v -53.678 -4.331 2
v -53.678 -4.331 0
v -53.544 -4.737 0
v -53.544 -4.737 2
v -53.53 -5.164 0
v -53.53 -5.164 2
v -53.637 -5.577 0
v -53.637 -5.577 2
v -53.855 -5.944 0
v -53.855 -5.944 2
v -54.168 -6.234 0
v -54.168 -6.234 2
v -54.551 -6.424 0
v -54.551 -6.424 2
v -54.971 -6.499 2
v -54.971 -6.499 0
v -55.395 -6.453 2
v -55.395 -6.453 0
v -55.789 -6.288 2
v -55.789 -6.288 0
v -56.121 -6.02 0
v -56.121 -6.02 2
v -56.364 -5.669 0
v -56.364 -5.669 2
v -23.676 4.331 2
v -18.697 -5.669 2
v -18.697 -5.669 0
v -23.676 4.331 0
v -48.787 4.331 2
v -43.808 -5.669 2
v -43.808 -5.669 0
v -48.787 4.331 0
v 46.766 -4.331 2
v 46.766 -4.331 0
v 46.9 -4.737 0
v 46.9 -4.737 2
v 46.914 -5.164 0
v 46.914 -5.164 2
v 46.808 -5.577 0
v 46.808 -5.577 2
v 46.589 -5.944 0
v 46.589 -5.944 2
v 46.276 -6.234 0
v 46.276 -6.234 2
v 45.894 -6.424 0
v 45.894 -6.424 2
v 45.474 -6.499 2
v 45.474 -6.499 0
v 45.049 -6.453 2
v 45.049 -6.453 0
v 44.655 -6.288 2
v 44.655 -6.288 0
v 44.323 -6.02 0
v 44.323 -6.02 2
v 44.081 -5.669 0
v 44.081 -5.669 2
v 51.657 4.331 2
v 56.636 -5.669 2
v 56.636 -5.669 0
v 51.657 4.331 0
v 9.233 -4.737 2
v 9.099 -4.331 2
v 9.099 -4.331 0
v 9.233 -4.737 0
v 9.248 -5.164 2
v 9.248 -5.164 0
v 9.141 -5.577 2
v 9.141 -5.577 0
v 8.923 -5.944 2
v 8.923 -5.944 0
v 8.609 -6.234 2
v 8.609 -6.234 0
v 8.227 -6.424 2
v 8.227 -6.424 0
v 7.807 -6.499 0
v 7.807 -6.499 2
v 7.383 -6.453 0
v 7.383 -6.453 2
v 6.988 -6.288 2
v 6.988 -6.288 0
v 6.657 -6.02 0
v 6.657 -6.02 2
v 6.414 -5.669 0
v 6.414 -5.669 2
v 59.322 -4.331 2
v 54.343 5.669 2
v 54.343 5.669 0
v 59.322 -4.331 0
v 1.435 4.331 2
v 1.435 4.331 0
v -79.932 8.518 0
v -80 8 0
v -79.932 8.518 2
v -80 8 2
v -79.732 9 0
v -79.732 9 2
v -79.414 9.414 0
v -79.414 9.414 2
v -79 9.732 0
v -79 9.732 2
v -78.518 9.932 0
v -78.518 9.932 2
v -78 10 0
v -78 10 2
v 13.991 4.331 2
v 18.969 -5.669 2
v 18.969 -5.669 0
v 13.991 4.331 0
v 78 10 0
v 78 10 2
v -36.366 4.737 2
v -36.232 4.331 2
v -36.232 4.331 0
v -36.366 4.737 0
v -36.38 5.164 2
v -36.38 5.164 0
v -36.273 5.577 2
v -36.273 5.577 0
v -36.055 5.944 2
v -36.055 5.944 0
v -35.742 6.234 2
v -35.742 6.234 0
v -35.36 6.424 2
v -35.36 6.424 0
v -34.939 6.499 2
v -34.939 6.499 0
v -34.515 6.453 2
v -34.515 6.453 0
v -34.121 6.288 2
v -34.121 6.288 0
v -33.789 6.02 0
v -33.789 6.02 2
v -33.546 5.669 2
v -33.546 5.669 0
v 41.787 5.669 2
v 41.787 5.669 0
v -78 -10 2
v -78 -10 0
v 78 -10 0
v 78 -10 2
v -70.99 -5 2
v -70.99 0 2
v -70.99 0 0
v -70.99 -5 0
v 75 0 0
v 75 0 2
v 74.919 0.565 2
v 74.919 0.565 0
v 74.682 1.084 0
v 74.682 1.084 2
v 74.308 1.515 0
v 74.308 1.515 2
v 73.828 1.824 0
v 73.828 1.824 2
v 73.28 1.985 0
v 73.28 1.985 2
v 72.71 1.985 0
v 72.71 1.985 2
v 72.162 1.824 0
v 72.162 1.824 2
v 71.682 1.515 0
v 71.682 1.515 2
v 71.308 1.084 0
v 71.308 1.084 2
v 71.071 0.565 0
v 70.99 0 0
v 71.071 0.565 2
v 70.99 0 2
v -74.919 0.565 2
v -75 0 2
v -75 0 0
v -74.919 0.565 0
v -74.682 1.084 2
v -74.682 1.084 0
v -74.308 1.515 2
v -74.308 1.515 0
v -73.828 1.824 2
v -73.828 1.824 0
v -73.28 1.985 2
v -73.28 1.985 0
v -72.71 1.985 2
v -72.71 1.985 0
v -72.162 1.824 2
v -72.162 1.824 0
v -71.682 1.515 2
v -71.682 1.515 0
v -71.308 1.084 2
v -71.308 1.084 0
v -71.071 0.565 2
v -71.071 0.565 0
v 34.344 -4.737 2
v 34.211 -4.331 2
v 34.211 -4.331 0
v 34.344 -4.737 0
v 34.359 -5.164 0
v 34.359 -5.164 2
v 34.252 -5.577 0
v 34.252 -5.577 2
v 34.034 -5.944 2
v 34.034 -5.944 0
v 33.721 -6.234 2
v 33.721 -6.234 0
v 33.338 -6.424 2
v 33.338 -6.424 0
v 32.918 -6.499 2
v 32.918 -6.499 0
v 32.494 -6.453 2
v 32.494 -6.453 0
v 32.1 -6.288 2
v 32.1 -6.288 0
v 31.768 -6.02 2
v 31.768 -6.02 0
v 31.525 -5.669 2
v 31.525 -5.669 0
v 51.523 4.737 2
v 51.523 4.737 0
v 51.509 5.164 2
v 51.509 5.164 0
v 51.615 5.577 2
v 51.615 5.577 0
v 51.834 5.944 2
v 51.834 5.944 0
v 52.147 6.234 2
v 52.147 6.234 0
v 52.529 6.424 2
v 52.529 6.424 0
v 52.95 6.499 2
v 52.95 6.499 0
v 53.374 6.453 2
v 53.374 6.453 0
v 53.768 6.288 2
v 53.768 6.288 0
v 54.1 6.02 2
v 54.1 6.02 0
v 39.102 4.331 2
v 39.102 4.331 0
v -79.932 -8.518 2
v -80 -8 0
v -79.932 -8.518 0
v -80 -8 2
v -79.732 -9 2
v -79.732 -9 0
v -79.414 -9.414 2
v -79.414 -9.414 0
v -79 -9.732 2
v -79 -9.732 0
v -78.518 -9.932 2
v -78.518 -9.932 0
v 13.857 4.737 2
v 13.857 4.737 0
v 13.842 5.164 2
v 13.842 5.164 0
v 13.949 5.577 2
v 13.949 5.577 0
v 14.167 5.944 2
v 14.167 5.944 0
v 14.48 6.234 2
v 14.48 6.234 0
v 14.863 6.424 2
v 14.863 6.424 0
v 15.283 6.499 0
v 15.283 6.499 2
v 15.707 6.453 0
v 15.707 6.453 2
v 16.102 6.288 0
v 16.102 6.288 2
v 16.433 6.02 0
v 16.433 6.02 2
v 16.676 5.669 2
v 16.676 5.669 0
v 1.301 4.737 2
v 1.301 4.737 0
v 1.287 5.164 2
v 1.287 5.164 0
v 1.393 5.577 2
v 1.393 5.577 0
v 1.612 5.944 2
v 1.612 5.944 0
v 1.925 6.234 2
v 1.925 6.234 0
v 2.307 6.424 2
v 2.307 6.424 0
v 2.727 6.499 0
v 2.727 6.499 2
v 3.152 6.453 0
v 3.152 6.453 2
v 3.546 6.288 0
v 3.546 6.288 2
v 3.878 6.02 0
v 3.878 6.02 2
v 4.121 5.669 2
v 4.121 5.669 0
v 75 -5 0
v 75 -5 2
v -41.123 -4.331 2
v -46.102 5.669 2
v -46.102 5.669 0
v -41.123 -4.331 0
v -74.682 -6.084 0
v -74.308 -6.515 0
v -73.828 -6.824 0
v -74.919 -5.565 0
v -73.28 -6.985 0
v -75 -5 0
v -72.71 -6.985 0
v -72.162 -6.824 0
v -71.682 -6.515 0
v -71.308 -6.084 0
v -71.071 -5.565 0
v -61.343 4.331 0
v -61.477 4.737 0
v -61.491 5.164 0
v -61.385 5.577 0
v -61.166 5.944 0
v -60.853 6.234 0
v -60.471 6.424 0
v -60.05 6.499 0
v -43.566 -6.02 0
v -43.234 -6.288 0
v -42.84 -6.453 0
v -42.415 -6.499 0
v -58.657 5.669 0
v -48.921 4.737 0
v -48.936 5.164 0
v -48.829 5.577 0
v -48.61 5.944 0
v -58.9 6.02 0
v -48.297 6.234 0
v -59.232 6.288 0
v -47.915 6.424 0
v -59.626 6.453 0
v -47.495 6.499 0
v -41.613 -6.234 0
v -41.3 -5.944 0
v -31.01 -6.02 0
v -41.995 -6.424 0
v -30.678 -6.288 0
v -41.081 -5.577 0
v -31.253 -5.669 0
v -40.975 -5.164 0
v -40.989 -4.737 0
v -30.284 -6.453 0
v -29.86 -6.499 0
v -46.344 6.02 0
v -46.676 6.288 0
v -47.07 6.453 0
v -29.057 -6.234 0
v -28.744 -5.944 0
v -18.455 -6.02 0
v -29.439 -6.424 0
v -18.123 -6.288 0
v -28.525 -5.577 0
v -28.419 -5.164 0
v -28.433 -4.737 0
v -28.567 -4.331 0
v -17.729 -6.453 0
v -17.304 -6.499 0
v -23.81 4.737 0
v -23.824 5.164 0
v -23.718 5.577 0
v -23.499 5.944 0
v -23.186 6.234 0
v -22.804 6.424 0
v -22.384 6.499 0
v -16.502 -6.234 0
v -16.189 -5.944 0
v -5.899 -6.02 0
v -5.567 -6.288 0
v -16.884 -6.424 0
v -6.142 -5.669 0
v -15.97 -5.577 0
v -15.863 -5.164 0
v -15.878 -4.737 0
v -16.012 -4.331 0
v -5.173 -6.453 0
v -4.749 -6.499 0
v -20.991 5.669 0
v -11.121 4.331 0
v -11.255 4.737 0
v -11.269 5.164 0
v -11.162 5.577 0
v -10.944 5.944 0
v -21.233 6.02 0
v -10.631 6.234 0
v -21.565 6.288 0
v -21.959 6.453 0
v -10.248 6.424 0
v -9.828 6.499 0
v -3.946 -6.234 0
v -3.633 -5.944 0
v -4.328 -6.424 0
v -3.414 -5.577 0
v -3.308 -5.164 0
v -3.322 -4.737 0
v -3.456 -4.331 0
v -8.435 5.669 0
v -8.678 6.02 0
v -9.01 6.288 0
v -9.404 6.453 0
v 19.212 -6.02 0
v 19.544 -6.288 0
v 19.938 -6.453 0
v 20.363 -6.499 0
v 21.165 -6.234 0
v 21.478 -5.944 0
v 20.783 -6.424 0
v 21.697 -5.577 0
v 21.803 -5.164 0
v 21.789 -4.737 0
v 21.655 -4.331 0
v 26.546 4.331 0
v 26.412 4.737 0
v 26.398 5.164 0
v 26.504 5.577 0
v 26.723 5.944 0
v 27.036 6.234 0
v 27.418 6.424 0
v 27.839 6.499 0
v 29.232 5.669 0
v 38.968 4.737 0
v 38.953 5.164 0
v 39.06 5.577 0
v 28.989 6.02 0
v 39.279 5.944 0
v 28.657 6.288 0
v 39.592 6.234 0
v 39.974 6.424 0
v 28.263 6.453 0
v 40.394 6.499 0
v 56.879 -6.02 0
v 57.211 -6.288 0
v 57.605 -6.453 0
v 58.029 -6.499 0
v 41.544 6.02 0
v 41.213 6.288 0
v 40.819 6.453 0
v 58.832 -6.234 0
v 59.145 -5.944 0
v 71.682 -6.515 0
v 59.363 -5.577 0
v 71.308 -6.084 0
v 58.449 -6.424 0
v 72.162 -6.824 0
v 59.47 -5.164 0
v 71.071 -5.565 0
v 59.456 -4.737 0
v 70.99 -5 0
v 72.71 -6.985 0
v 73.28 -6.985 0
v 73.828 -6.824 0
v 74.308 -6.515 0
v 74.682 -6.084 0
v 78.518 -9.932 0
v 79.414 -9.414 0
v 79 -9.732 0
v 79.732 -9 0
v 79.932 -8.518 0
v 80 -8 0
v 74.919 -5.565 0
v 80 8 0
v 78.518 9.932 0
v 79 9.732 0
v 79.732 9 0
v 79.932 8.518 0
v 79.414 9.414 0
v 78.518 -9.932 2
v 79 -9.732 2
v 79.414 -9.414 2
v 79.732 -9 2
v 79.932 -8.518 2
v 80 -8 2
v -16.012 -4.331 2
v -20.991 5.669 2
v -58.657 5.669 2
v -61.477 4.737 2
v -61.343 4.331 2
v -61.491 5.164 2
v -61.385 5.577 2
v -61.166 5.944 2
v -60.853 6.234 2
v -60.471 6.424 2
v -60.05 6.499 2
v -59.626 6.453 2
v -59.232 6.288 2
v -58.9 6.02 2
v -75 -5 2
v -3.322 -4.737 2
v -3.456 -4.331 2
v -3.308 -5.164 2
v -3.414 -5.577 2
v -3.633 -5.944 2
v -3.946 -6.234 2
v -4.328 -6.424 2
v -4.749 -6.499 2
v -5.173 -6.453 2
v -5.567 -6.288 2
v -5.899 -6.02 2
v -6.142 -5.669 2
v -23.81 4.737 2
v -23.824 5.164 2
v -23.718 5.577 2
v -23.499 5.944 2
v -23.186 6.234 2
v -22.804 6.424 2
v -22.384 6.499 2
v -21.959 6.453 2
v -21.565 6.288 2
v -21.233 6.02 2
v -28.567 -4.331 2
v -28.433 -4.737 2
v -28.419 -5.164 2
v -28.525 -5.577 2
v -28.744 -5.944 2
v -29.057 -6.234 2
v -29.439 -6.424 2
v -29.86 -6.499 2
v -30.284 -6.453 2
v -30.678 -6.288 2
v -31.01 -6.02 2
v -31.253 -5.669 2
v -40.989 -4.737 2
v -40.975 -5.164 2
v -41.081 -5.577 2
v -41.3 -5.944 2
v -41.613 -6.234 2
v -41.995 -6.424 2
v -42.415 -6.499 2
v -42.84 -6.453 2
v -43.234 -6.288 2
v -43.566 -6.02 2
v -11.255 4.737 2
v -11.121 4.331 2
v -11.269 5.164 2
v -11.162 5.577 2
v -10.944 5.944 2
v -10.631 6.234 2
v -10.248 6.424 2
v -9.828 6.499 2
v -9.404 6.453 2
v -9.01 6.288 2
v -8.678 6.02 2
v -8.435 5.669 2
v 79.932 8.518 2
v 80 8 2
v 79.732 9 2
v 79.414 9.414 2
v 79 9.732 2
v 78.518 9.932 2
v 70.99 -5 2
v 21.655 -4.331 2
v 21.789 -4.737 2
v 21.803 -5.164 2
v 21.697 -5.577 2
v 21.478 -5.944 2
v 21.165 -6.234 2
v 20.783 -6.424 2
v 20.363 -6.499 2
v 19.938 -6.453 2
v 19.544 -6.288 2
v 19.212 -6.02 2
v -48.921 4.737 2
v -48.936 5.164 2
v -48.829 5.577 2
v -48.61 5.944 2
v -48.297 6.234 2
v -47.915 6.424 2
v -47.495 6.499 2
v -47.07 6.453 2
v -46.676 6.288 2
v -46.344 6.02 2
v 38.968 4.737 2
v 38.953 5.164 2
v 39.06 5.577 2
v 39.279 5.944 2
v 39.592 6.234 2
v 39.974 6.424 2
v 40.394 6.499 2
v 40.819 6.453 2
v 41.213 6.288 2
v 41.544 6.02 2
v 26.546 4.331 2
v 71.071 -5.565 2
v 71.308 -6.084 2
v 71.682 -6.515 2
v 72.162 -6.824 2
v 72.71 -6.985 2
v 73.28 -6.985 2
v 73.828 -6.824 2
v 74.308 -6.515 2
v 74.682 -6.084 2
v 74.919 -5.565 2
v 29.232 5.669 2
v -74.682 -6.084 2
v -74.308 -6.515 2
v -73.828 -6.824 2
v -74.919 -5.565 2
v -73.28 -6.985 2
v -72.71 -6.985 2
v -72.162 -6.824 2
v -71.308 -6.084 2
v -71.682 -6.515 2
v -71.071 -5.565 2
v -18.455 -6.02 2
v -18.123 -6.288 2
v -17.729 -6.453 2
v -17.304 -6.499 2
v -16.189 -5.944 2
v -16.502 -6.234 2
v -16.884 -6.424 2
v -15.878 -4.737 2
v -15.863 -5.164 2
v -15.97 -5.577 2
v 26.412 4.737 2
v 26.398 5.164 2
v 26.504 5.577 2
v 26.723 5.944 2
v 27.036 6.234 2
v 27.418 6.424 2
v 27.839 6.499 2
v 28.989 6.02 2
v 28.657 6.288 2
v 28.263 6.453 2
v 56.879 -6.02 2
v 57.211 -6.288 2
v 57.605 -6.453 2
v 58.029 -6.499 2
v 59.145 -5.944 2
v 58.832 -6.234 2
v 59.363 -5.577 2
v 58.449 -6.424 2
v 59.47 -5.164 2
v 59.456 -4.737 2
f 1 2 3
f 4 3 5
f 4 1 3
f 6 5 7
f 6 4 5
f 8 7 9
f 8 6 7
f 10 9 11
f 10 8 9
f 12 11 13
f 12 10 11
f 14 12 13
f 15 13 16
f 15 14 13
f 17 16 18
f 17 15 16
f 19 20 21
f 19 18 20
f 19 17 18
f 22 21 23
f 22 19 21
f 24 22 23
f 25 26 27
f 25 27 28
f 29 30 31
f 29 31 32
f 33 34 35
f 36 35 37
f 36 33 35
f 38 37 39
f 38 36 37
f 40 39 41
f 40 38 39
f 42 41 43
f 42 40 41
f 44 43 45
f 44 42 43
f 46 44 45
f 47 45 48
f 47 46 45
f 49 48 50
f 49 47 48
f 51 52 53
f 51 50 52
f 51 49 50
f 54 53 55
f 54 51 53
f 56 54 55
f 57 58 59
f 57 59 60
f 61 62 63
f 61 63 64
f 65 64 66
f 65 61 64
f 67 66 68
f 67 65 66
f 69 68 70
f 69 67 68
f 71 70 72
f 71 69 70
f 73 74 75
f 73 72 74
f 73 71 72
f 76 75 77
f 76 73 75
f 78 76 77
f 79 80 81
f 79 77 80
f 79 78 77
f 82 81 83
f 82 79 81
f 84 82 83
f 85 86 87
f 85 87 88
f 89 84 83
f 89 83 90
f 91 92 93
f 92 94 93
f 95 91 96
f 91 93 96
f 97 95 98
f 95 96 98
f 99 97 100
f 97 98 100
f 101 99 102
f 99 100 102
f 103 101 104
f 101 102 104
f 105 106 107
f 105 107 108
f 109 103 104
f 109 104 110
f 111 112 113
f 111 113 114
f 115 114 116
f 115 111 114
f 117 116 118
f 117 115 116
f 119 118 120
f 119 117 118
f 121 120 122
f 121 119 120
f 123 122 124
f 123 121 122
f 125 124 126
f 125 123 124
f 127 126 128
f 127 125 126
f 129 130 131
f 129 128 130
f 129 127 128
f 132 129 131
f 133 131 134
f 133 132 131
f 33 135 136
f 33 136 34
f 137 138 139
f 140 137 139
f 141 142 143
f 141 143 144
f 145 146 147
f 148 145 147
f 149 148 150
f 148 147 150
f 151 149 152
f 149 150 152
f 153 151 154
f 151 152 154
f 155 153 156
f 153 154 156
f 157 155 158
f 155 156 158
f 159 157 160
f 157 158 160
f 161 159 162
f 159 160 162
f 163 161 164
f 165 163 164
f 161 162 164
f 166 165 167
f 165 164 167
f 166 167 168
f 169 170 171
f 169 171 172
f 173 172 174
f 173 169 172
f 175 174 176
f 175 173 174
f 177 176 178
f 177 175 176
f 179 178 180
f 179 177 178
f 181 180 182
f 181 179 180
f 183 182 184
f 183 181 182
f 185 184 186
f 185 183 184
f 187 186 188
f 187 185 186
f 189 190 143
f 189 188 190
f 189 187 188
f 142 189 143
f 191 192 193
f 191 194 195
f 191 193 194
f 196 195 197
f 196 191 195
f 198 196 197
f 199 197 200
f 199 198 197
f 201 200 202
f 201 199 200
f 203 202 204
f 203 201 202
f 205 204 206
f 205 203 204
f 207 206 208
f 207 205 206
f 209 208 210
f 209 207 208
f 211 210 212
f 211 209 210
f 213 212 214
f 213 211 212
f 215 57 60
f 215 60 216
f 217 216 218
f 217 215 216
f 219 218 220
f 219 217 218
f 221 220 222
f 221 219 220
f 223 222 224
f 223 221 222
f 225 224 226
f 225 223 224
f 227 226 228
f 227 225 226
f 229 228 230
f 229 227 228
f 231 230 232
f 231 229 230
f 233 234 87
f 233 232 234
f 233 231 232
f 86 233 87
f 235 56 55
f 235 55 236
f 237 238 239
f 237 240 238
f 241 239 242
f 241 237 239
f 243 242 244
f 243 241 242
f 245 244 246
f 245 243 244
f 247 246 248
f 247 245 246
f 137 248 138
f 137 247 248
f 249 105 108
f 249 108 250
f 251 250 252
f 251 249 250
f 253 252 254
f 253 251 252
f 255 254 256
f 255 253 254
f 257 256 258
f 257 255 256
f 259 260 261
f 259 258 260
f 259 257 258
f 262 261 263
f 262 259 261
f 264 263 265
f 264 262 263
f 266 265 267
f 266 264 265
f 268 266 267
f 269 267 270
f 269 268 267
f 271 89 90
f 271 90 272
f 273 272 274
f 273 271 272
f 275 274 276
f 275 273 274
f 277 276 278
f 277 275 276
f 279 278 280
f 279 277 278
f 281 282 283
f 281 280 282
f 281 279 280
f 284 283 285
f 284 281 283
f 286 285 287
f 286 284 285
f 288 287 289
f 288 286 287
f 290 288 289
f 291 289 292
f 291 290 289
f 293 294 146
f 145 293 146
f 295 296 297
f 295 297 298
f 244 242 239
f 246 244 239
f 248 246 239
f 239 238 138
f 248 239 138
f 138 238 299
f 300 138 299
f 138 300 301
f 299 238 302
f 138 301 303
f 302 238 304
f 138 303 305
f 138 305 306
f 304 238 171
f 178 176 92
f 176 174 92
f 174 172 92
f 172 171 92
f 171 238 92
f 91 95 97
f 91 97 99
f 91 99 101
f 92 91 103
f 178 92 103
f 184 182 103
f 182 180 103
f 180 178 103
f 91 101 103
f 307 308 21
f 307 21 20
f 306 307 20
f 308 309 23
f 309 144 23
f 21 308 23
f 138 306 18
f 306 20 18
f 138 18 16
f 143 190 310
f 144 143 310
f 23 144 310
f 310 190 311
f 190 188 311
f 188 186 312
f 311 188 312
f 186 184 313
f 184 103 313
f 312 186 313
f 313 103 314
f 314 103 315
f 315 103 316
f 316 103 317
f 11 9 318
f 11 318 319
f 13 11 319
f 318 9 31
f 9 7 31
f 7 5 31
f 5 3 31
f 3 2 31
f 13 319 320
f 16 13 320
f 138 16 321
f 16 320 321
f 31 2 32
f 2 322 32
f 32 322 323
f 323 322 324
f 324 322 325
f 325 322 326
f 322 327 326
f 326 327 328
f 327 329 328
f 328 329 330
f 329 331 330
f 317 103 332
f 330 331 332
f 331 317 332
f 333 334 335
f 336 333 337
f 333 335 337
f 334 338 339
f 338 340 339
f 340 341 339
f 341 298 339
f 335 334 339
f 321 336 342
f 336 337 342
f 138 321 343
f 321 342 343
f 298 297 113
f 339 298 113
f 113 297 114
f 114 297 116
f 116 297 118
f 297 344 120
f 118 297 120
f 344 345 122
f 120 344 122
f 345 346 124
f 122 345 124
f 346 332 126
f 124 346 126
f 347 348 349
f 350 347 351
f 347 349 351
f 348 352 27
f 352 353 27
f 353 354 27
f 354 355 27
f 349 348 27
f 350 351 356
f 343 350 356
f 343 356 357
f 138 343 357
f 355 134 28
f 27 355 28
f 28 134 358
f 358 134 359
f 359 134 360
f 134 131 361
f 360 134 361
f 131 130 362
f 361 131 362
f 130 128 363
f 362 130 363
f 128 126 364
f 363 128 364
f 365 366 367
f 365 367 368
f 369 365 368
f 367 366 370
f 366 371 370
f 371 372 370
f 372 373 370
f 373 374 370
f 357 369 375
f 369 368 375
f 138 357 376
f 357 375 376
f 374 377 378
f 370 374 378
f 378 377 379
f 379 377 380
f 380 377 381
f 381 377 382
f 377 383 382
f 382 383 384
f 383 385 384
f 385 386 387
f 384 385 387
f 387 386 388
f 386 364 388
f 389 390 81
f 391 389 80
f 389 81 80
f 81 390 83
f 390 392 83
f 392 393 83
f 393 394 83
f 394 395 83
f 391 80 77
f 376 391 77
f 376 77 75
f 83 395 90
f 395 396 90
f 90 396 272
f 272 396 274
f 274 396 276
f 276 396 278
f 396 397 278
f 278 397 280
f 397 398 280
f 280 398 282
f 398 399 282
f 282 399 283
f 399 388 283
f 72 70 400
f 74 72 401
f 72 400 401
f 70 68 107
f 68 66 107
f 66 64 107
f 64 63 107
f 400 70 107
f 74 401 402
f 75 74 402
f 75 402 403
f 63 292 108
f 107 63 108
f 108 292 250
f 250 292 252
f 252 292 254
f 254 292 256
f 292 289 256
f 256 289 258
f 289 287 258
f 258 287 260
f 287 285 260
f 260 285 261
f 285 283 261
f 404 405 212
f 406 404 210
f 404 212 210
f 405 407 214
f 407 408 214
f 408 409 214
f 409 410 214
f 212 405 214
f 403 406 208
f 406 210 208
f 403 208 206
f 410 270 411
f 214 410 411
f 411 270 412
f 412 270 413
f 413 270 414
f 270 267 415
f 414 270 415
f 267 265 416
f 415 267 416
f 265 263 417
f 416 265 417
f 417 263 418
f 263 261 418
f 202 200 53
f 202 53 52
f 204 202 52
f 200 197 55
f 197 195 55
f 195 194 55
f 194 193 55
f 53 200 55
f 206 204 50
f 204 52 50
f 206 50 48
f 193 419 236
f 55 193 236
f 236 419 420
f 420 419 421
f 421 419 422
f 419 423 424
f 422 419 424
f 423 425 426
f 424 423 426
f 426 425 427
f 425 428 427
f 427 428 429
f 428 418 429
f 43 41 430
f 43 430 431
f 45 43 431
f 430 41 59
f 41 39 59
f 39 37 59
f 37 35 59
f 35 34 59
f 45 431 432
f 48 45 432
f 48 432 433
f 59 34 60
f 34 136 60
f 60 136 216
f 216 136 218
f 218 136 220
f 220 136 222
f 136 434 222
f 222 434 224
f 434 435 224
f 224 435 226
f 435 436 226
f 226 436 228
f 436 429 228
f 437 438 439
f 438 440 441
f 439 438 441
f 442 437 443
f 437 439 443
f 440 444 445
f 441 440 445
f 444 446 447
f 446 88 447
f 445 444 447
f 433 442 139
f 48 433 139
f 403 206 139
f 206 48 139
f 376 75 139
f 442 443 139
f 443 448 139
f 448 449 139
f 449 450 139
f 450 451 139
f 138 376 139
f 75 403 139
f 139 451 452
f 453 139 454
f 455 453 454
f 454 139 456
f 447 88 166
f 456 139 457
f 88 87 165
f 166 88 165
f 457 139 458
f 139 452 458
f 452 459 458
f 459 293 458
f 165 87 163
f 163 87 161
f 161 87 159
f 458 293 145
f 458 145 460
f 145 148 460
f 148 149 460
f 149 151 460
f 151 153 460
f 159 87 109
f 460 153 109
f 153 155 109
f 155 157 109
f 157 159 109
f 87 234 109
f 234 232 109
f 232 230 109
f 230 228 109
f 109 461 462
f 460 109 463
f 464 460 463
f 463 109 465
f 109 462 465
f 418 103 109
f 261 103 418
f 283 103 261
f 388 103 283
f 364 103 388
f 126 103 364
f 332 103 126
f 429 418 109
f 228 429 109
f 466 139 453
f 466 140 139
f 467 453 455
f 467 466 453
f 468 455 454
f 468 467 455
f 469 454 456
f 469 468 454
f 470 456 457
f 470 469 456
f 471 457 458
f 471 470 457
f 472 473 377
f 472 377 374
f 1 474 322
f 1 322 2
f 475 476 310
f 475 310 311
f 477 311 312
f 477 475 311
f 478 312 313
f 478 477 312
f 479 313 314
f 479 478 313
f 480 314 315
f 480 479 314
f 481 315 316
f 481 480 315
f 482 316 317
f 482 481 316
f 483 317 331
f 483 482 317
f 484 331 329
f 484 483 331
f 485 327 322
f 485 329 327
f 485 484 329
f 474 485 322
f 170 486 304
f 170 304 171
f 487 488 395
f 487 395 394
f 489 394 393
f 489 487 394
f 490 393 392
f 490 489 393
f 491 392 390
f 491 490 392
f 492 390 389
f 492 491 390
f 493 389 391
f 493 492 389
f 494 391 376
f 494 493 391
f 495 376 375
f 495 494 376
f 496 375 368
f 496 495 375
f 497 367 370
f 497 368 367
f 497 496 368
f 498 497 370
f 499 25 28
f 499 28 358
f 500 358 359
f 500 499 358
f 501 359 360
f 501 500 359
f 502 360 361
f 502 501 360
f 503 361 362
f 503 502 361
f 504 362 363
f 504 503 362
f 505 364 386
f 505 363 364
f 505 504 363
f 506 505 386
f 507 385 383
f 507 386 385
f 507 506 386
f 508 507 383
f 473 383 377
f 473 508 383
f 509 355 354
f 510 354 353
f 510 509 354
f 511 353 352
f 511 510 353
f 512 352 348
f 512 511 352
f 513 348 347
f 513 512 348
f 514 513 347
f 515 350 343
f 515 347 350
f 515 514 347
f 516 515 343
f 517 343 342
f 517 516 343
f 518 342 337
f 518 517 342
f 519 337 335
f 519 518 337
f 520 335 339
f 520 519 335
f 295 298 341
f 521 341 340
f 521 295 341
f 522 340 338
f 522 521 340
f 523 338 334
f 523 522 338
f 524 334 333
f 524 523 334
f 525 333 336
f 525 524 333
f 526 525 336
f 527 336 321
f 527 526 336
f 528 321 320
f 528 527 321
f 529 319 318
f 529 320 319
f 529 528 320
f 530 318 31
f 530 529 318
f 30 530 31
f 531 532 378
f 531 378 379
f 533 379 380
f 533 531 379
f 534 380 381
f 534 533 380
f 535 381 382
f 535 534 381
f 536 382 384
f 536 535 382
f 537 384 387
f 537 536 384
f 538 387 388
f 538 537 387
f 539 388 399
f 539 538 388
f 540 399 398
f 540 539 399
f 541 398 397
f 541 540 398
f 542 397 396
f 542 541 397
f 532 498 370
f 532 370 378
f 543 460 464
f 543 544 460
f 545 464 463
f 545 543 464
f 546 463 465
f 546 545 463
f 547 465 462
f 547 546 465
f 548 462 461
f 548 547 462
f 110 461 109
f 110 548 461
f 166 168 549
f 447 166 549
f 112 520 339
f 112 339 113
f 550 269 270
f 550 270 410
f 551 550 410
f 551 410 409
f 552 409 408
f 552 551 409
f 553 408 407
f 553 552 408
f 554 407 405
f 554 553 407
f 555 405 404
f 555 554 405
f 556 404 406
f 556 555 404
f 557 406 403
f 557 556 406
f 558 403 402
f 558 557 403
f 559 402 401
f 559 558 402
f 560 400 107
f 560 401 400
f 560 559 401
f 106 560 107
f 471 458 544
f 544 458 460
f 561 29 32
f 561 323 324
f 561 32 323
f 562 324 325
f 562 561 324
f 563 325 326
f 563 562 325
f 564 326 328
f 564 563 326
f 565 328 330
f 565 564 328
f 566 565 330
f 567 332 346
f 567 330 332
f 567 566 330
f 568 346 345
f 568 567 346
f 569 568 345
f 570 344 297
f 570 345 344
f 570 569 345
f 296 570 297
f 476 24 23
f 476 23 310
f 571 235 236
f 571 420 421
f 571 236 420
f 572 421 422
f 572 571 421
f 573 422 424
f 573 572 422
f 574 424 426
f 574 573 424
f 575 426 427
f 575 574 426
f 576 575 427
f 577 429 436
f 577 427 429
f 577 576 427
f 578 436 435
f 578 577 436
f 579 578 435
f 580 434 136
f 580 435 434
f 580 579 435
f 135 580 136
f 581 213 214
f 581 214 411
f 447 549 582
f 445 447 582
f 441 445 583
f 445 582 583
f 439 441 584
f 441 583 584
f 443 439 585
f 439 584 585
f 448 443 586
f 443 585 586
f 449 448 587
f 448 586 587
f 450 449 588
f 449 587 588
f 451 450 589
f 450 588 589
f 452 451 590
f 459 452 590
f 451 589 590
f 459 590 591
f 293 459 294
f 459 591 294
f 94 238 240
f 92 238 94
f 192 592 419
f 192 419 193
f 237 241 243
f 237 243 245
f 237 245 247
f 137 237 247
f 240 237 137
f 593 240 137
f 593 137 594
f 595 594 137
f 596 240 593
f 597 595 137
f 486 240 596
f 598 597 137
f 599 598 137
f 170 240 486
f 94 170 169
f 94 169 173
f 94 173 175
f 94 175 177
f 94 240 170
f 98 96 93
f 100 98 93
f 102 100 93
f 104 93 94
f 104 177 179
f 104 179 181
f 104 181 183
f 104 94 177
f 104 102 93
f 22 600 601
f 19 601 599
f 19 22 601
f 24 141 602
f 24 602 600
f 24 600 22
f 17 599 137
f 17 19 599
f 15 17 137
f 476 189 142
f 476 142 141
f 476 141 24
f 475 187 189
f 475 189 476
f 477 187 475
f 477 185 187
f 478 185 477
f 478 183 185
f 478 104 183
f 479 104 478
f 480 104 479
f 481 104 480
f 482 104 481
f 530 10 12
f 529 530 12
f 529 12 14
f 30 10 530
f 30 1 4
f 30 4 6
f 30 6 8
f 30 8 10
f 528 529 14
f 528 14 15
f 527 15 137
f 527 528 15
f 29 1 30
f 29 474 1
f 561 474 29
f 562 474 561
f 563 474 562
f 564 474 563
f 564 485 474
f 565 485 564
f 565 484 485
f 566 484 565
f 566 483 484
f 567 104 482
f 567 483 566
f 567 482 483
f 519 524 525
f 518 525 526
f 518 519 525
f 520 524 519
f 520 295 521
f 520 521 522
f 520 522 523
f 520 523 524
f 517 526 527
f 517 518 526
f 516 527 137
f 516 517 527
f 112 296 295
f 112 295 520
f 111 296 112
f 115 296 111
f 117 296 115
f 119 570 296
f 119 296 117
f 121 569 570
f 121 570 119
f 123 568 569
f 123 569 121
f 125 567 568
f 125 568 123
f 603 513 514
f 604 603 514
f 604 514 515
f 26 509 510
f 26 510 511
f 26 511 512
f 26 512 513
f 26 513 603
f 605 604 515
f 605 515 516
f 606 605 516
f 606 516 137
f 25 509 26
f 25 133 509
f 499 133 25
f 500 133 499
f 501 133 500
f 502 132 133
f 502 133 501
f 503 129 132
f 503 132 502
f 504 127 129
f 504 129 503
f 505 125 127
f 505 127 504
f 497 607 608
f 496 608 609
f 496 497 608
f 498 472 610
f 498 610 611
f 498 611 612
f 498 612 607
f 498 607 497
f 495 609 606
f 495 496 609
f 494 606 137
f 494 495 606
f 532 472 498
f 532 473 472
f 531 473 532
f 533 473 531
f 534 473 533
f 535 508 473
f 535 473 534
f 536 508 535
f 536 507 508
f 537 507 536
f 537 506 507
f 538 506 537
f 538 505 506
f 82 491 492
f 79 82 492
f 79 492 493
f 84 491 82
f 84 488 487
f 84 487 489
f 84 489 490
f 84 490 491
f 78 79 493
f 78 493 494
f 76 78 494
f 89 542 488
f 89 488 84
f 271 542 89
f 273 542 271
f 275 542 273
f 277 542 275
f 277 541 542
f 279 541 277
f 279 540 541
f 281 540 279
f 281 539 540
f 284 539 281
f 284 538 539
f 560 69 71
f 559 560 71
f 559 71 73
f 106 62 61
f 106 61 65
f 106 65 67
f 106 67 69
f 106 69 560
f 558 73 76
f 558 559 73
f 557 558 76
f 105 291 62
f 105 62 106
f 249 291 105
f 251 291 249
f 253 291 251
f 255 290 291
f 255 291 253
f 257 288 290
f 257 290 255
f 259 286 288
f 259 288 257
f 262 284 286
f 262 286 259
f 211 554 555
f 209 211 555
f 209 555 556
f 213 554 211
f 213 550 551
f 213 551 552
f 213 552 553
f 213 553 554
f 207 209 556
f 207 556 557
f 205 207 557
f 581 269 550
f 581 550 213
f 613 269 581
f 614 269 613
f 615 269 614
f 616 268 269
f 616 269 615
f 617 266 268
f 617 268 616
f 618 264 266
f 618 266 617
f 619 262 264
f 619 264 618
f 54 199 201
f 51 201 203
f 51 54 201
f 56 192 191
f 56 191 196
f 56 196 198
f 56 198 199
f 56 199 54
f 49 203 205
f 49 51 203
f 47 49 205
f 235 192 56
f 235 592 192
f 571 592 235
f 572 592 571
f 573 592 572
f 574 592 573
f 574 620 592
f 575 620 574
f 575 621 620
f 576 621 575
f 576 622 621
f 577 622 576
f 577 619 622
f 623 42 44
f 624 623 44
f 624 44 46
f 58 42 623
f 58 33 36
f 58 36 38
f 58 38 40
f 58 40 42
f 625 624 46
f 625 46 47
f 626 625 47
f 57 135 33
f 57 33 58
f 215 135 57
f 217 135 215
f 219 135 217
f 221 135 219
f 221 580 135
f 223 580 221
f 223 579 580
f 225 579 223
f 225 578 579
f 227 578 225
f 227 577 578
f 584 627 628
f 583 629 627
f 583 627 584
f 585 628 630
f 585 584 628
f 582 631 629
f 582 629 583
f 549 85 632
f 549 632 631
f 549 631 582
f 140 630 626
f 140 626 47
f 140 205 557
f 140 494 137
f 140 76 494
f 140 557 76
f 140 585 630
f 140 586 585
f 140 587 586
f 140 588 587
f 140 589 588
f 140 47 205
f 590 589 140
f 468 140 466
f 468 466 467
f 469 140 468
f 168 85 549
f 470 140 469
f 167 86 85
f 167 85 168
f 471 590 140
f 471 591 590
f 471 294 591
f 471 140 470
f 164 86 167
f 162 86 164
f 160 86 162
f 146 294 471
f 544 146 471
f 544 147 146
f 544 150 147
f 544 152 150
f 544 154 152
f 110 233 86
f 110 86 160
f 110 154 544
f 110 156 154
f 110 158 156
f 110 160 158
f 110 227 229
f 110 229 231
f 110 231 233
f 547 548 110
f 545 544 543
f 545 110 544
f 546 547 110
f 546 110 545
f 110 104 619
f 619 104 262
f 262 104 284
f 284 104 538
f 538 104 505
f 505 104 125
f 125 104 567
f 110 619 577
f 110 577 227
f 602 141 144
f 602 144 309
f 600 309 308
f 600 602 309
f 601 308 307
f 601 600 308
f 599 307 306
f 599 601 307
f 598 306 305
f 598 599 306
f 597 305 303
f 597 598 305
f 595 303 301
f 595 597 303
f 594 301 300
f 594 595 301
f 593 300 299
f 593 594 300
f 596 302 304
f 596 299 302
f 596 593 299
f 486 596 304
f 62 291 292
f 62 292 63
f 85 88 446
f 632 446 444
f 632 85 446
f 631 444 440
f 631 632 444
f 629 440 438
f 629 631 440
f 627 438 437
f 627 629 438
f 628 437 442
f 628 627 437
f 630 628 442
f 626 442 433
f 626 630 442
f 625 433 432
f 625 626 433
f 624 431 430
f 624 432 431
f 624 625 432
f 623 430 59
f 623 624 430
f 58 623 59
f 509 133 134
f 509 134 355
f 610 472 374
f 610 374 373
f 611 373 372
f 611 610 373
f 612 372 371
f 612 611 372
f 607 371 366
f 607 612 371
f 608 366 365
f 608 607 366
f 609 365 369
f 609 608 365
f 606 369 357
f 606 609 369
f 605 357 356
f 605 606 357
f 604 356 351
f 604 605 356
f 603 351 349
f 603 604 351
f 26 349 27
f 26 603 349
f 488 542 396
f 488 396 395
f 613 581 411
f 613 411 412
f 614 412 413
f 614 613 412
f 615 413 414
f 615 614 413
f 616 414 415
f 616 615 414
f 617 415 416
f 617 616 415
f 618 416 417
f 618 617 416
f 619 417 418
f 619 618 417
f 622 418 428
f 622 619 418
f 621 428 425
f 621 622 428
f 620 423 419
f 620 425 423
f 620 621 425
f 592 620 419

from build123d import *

# Parameters (mm, degrees)
SKETCH1_W           = 160
SKETCH1_H           = 20
BOSS_EXTRUDE1_DEPTH = 2
FILLET1_R           = 2
CUT_EXTRUDE1_DEPTH  = 81.647380615
CUT_EXTRUDE2_DEPTH  = 10


with BuildPart() as part:
    # Sketch1 → Boss-Extrude1 (new body)
    with BuildSketch(Plane.XY):
        Rectangle(SKETCH1_W, SKETCH1_H)
    extrude(amount=BOSS_EXTRUDE1_DEPTH)

    # Fillet1
    fillet1_edges = [part.edges().sort_by_distance(p)[0] for p in [
        (80, -10, 1),
        (-80, -10, 1),
        (-80, 10, 1),
        (80, 10, 1),
    ]]
    fillet(fillet1_edges, radius=FILLET1_R)

    # Sketch2 → Cut-Extrude1 (cut, through all)
    with BuildSketch(Plane.XY.offset(2)):
        with BuildLine():
            Line((-70.99, 0), (-70.99, -5))
            ThreePointArc((-70.99, -5), (-72.995, -7.005), (-75, -5))
            Line((-75, -5), (-75, 0))
            ThreePointArc((-75, 0), (-72.995, 2.005), (-70.99, 0))
        make_face()
        with BuildLine():
            Line((70.99, 0), (70.99, -5))
            ThreePointArc((70.99, -5), (72.995, -7.005), (75, -5))
            Line((75, -5), (75, 0))
            ThreePointArc((75, 0), (72.995, 2.005), (70.99, 0))
        make_face()
    extrude(amount=-CUT_EXTRUDE1_DEPTH, mode=Mode.SUBTRACT)

    # Sketch3 → Cut-Extrude2 (cut)
    with BuildSketch(Plane.XY.offset(2)):
        with BuildLine():
            Line((-58.657225294, 5.668547746), (-53.678372606, -4.331452254))
            ThreePointArc((-53.678372606, -4.331452254), (-54.352599567, -6.342774706), (-56.363922019, -5.668547746))
            Line((-56.363922019, -5.668547746), (-61.342774706, 4.331452254))
            ThreePointArc((-61.342774706, 4.331452254), (-60.668547746, 6.342774706), (-58.657225294, 5.668547746))
        make_face()
        with BuildLine():
            Line((-46.101669738, 5.668547746), (-41.12281705, -4.331452254))
            ThreePointArc((-41.12281705, -4.331452254), (-41.797044011, -6.342774706), (-43.808366463, -5.668547746))
            Line((-43.808366463, -5.668547746), (-48.787219151, 4.331452254))
            ThreePointArc((-48.787219151, 4.331452254), (-48.11299219, 6.342774706), (-46.101669738, 5.668547746))
        make_face()
        with BuildLine():
            Line((-33.546114183, 5.668547746), (-28.567261495, -4.331452254))
            ThreePointArc((-28.567261495, -4.331452254), (-29.241488456, -6.342774706), (-31.252810907, -5.668547746))
            Line((-31.252810907, -5.668547746), (-36.231663595, 4.331452254))
            ThreePointArc((-36.231663595, 4.331452254), (-35.557436634, 6.342774706), (-33.546114183, 5.668547746))
        make_face()
        with BuildLine():
            Line((-20.990558627, 5.668547746), (-16.011705939, -4.331452254))
            ThreePointArc((-16.011705939, -4.331452254), (-16.6859329, -6.342774706), (-18.697255352, -5.668547746))
            Line((-18.697255352, -5.668547746), (-23.67610804, 4.331452254))
            ThreePointArc((-23.67610804, 4.331452254), (-23.001881079, 6.342774706), (-20.990558627, 5.668547746))
        make_face()
        with BuildLine():
            Line((-8.435003071, 5.668547746), (-3.456150384, -4.331452254))
            ThreePointArc((-3.456150384, -4.331452254), (-4.130377344, -6.342774706), (-6.141699796, -5.668547746))
            Line((-6.141699796, -5.668547746), (-11.120552484, 4.331452254))
            ThreePointArc((-11.120552484, 4.331452254), (-10.446325523, 6.342774706), (-8.435003071, 5.668547746))
        make_face()
        with BuildLine():
            Line((4.120552484, 5.668547746), (9.099405172, -4.331452254))
            ThreePointArc((9.099405172, -4.331452254), (8.425178211, -6.342774706), (6.413855759, -5.668547746))
            Line((6.413855759, -5.668547746), (1.435003071, 4.331452254))
            ThreePointArc((1.435003071, 4.331452254), (2.109230032, 6.342774706), (4.120552484, 5.668547746))
        make_face()
        with BuildLine():
            Line((16.67610804, 5.668547746), (21.654960727, -4.331452254))
            ThreePointArc((21.654960727, -4.331452254), (20.980733767, -6.342774706), (18.969411315, -5.668547746))
            Line((18.969411315, -5.668547746), (13.990558627, 4.331452254))
            ThreePointArc((13.990558627, 4.331452254), (14.664785588, 6.342774706), (16.67610804, 5.668547746))
        make_face()
        with BuildLine():
            Line((29.231663595, 5.668547746), (34.210516283, -4.331452254))
            ThreePointArc((34.210516283, -4.331452254), (33.536289322, -6.342774706), (31.52496687, -5.668547746))
            Line((31.52496687, -5.668547746), (26.546114183, 4.331452254))
            ThreePointArc((26.546114183, 4.331452254), (27.220341143, 6.342774706), (29.231663595, 5.668547746))
        make_face()
        with BuildLine():
            Line((41.787219151, 5.668547746), (46.766071839, -4.331452254))
            ThreePointArc((46.766071839, -4.331452254), (46.091844878, -6.342774706), (44.080522426, -5.668547746))
            Line((44.080522426, -5.668547746), (39.101669738, 4.331452254))
            ThreePointArc((39.101669738, 4.331452254), (39.775896699, 6.342774706), (41.787219151, 5.668547746))
        make_face()
        with BuildLine():
            Line((54.342774706, 5.668547746), (59.321627394, -4.331452254))
            ThreePointArc((59.321627394, -4.331452254), (58.647400433, -6.342774706), (56.636077981, -5.668547746))
            Line((56.636077981, -5.668547746), (51.657225294, 4.331452254))
            ThreePointArc((51.657225294, 4.331452254), (52.331452254, 6.342774706), (54.342774706, 5.668547746))
        make_face()
    extrude(amount=-CUT_EXTRUDE2_DEPTH, mode=Mode.SUBTRACT)


solid = part.part
